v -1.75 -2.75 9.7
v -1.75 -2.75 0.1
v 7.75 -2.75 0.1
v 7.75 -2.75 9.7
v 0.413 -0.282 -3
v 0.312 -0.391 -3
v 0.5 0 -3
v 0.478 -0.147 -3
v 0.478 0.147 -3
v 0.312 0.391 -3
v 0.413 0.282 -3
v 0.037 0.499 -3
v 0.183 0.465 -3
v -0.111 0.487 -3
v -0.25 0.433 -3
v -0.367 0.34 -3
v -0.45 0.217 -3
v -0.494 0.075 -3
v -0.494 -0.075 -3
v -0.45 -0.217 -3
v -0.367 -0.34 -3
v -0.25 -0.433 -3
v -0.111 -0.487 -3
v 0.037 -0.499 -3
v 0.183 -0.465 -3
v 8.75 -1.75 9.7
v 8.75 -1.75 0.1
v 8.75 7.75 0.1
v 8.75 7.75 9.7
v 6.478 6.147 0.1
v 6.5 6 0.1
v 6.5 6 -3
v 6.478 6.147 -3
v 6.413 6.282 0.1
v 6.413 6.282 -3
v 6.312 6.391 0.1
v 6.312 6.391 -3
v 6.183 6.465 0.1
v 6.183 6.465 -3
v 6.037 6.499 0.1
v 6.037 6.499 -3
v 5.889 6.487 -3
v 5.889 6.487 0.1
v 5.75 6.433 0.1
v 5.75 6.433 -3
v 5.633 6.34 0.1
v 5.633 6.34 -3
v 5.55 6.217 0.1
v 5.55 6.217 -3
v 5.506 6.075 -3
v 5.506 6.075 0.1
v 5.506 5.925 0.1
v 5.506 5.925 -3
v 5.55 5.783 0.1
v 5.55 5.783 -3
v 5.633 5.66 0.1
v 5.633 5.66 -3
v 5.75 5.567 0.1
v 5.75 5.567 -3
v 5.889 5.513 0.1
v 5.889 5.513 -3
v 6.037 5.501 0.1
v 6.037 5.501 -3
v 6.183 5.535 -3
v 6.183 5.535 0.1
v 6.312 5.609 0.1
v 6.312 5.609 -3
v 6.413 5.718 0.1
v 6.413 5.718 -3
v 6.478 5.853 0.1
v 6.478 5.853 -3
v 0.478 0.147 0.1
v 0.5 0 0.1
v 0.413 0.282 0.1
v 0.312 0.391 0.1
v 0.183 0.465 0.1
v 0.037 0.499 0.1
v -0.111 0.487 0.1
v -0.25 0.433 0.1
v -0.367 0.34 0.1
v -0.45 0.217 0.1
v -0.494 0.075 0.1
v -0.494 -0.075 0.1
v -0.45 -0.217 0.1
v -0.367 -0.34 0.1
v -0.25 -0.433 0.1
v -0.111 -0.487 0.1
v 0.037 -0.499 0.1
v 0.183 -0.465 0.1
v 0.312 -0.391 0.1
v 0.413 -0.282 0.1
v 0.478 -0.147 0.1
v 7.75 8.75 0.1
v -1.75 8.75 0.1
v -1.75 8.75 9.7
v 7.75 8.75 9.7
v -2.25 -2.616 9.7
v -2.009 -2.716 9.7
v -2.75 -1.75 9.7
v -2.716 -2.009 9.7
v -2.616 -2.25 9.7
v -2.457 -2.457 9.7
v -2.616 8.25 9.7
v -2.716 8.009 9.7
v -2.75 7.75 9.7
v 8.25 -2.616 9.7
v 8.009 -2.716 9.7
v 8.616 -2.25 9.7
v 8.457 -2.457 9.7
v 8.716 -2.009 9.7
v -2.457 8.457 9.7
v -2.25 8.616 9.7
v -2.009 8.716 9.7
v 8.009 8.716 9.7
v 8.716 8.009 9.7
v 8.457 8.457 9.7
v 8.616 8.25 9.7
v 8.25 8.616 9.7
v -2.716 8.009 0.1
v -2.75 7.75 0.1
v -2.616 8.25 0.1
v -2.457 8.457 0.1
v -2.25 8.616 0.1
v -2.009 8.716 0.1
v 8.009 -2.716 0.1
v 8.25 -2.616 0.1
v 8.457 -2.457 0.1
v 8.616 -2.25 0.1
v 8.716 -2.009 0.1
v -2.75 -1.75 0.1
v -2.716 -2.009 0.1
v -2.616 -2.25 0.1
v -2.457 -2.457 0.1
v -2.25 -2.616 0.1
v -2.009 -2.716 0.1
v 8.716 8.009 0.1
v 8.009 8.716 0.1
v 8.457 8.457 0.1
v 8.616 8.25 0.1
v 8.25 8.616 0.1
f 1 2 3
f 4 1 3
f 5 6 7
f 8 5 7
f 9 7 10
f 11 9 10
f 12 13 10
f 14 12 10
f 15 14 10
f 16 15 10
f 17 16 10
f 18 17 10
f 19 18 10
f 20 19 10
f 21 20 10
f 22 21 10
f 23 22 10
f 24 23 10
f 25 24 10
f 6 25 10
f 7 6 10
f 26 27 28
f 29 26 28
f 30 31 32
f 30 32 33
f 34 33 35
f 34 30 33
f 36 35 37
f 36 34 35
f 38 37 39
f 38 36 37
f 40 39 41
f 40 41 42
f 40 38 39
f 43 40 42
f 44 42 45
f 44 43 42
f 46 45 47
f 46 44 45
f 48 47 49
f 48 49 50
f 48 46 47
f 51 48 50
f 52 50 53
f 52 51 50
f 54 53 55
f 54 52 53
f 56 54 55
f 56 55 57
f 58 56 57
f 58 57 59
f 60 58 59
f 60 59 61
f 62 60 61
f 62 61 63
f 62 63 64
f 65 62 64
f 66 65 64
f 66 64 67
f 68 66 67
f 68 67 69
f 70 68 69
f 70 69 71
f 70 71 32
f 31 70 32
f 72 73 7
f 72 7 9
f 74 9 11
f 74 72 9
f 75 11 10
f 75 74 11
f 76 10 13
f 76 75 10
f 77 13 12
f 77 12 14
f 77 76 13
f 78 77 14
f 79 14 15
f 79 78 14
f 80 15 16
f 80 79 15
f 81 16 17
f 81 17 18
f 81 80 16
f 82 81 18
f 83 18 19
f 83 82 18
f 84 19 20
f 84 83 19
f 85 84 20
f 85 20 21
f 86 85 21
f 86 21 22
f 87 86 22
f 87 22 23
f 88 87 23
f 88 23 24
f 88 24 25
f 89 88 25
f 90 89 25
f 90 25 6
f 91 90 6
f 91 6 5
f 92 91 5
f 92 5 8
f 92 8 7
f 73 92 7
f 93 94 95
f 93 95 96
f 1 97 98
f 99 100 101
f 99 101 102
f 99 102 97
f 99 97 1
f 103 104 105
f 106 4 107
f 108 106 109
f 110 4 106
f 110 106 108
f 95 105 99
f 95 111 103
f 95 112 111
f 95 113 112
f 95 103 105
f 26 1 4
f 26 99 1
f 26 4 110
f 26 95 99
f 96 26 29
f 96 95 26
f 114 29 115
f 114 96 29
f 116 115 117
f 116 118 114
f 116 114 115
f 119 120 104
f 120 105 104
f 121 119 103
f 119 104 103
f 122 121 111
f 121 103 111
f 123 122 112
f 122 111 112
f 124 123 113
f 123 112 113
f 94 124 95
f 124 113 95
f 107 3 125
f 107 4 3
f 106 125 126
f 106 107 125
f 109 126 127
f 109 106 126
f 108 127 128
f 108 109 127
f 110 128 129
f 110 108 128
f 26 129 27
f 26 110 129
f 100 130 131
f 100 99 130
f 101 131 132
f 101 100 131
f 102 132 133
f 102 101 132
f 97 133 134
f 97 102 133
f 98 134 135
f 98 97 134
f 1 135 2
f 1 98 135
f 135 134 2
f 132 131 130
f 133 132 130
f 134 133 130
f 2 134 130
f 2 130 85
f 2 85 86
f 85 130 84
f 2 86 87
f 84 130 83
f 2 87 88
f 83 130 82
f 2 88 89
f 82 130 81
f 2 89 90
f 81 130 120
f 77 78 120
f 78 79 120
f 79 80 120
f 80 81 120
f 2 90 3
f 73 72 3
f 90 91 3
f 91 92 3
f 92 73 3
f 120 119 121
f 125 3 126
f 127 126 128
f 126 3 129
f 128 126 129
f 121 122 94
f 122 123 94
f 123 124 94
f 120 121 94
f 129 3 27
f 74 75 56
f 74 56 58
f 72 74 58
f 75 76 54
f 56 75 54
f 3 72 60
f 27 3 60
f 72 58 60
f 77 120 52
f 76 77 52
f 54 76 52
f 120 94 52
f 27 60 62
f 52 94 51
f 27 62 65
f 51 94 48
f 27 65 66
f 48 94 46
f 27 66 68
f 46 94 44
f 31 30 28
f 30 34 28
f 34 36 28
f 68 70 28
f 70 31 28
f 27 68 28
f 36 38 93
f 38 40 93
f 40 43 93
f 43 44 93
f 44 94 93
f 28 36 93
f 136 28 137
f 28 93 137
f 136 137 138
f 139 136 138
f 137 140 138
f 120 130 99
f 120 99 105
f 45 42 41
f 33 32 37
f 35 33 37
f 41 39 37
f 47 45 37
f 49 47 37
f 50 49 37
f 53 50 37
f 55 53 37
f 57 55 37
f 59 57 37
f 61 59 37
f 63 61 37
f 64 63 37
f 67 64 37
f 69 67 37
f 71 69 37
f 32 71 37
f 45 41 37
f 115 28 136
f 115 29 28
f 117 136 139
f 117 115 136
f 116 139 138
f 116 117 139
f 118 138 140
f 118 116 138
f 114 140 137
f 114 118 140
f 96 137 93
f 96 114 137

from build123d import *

# Parameters (mm, degrees)
SKETCH001_R  = 0.5
PAD001_DEPTH = 3.5
SKETCH_W     = 11.5
SKETCH_H     = 11.5
PAD_DEPTH    = 9.6
FILLET_R     = 1


with BuildPart() as pad001:
    # Sketch001 → Pad001 (new body)
    with BuildSketch(Plane.XY.offset(0.5)):
        Circle(SKETCH001_R)
        with Locations((6, 6)):
            Circle(SKETCH001_R)
    extrude(amount=-PAD001_DEPTH)


with BuildPart() as fillet_mp_cp:
    # Sketch → Pad (new body)
    with BuildSketch(Plane.XY.offset(0.1)):
        with Locations((3, 3)):
            Rectangle(SKETCH_W, SKETCH_H)
    extrude(amount=PAD_DEPTH)

    # Fillet
    fillet_edges = [fillet_mp_cp.edges().sort_by_distance(p)[0] for p in [
        (8.75, -2.75, 4.9),
        (8.75, 8.75, 4.9),
        (-2.75, -2.75, 4.9),
        (-2.75, 8.75, 4.9),
    ]]
    fillet(fillet_edges, radius=FILLET_R)

    # Fillet_mp_cp: union Pad001
    add(pad001.part)


solid = fillet_mp_cp.part
